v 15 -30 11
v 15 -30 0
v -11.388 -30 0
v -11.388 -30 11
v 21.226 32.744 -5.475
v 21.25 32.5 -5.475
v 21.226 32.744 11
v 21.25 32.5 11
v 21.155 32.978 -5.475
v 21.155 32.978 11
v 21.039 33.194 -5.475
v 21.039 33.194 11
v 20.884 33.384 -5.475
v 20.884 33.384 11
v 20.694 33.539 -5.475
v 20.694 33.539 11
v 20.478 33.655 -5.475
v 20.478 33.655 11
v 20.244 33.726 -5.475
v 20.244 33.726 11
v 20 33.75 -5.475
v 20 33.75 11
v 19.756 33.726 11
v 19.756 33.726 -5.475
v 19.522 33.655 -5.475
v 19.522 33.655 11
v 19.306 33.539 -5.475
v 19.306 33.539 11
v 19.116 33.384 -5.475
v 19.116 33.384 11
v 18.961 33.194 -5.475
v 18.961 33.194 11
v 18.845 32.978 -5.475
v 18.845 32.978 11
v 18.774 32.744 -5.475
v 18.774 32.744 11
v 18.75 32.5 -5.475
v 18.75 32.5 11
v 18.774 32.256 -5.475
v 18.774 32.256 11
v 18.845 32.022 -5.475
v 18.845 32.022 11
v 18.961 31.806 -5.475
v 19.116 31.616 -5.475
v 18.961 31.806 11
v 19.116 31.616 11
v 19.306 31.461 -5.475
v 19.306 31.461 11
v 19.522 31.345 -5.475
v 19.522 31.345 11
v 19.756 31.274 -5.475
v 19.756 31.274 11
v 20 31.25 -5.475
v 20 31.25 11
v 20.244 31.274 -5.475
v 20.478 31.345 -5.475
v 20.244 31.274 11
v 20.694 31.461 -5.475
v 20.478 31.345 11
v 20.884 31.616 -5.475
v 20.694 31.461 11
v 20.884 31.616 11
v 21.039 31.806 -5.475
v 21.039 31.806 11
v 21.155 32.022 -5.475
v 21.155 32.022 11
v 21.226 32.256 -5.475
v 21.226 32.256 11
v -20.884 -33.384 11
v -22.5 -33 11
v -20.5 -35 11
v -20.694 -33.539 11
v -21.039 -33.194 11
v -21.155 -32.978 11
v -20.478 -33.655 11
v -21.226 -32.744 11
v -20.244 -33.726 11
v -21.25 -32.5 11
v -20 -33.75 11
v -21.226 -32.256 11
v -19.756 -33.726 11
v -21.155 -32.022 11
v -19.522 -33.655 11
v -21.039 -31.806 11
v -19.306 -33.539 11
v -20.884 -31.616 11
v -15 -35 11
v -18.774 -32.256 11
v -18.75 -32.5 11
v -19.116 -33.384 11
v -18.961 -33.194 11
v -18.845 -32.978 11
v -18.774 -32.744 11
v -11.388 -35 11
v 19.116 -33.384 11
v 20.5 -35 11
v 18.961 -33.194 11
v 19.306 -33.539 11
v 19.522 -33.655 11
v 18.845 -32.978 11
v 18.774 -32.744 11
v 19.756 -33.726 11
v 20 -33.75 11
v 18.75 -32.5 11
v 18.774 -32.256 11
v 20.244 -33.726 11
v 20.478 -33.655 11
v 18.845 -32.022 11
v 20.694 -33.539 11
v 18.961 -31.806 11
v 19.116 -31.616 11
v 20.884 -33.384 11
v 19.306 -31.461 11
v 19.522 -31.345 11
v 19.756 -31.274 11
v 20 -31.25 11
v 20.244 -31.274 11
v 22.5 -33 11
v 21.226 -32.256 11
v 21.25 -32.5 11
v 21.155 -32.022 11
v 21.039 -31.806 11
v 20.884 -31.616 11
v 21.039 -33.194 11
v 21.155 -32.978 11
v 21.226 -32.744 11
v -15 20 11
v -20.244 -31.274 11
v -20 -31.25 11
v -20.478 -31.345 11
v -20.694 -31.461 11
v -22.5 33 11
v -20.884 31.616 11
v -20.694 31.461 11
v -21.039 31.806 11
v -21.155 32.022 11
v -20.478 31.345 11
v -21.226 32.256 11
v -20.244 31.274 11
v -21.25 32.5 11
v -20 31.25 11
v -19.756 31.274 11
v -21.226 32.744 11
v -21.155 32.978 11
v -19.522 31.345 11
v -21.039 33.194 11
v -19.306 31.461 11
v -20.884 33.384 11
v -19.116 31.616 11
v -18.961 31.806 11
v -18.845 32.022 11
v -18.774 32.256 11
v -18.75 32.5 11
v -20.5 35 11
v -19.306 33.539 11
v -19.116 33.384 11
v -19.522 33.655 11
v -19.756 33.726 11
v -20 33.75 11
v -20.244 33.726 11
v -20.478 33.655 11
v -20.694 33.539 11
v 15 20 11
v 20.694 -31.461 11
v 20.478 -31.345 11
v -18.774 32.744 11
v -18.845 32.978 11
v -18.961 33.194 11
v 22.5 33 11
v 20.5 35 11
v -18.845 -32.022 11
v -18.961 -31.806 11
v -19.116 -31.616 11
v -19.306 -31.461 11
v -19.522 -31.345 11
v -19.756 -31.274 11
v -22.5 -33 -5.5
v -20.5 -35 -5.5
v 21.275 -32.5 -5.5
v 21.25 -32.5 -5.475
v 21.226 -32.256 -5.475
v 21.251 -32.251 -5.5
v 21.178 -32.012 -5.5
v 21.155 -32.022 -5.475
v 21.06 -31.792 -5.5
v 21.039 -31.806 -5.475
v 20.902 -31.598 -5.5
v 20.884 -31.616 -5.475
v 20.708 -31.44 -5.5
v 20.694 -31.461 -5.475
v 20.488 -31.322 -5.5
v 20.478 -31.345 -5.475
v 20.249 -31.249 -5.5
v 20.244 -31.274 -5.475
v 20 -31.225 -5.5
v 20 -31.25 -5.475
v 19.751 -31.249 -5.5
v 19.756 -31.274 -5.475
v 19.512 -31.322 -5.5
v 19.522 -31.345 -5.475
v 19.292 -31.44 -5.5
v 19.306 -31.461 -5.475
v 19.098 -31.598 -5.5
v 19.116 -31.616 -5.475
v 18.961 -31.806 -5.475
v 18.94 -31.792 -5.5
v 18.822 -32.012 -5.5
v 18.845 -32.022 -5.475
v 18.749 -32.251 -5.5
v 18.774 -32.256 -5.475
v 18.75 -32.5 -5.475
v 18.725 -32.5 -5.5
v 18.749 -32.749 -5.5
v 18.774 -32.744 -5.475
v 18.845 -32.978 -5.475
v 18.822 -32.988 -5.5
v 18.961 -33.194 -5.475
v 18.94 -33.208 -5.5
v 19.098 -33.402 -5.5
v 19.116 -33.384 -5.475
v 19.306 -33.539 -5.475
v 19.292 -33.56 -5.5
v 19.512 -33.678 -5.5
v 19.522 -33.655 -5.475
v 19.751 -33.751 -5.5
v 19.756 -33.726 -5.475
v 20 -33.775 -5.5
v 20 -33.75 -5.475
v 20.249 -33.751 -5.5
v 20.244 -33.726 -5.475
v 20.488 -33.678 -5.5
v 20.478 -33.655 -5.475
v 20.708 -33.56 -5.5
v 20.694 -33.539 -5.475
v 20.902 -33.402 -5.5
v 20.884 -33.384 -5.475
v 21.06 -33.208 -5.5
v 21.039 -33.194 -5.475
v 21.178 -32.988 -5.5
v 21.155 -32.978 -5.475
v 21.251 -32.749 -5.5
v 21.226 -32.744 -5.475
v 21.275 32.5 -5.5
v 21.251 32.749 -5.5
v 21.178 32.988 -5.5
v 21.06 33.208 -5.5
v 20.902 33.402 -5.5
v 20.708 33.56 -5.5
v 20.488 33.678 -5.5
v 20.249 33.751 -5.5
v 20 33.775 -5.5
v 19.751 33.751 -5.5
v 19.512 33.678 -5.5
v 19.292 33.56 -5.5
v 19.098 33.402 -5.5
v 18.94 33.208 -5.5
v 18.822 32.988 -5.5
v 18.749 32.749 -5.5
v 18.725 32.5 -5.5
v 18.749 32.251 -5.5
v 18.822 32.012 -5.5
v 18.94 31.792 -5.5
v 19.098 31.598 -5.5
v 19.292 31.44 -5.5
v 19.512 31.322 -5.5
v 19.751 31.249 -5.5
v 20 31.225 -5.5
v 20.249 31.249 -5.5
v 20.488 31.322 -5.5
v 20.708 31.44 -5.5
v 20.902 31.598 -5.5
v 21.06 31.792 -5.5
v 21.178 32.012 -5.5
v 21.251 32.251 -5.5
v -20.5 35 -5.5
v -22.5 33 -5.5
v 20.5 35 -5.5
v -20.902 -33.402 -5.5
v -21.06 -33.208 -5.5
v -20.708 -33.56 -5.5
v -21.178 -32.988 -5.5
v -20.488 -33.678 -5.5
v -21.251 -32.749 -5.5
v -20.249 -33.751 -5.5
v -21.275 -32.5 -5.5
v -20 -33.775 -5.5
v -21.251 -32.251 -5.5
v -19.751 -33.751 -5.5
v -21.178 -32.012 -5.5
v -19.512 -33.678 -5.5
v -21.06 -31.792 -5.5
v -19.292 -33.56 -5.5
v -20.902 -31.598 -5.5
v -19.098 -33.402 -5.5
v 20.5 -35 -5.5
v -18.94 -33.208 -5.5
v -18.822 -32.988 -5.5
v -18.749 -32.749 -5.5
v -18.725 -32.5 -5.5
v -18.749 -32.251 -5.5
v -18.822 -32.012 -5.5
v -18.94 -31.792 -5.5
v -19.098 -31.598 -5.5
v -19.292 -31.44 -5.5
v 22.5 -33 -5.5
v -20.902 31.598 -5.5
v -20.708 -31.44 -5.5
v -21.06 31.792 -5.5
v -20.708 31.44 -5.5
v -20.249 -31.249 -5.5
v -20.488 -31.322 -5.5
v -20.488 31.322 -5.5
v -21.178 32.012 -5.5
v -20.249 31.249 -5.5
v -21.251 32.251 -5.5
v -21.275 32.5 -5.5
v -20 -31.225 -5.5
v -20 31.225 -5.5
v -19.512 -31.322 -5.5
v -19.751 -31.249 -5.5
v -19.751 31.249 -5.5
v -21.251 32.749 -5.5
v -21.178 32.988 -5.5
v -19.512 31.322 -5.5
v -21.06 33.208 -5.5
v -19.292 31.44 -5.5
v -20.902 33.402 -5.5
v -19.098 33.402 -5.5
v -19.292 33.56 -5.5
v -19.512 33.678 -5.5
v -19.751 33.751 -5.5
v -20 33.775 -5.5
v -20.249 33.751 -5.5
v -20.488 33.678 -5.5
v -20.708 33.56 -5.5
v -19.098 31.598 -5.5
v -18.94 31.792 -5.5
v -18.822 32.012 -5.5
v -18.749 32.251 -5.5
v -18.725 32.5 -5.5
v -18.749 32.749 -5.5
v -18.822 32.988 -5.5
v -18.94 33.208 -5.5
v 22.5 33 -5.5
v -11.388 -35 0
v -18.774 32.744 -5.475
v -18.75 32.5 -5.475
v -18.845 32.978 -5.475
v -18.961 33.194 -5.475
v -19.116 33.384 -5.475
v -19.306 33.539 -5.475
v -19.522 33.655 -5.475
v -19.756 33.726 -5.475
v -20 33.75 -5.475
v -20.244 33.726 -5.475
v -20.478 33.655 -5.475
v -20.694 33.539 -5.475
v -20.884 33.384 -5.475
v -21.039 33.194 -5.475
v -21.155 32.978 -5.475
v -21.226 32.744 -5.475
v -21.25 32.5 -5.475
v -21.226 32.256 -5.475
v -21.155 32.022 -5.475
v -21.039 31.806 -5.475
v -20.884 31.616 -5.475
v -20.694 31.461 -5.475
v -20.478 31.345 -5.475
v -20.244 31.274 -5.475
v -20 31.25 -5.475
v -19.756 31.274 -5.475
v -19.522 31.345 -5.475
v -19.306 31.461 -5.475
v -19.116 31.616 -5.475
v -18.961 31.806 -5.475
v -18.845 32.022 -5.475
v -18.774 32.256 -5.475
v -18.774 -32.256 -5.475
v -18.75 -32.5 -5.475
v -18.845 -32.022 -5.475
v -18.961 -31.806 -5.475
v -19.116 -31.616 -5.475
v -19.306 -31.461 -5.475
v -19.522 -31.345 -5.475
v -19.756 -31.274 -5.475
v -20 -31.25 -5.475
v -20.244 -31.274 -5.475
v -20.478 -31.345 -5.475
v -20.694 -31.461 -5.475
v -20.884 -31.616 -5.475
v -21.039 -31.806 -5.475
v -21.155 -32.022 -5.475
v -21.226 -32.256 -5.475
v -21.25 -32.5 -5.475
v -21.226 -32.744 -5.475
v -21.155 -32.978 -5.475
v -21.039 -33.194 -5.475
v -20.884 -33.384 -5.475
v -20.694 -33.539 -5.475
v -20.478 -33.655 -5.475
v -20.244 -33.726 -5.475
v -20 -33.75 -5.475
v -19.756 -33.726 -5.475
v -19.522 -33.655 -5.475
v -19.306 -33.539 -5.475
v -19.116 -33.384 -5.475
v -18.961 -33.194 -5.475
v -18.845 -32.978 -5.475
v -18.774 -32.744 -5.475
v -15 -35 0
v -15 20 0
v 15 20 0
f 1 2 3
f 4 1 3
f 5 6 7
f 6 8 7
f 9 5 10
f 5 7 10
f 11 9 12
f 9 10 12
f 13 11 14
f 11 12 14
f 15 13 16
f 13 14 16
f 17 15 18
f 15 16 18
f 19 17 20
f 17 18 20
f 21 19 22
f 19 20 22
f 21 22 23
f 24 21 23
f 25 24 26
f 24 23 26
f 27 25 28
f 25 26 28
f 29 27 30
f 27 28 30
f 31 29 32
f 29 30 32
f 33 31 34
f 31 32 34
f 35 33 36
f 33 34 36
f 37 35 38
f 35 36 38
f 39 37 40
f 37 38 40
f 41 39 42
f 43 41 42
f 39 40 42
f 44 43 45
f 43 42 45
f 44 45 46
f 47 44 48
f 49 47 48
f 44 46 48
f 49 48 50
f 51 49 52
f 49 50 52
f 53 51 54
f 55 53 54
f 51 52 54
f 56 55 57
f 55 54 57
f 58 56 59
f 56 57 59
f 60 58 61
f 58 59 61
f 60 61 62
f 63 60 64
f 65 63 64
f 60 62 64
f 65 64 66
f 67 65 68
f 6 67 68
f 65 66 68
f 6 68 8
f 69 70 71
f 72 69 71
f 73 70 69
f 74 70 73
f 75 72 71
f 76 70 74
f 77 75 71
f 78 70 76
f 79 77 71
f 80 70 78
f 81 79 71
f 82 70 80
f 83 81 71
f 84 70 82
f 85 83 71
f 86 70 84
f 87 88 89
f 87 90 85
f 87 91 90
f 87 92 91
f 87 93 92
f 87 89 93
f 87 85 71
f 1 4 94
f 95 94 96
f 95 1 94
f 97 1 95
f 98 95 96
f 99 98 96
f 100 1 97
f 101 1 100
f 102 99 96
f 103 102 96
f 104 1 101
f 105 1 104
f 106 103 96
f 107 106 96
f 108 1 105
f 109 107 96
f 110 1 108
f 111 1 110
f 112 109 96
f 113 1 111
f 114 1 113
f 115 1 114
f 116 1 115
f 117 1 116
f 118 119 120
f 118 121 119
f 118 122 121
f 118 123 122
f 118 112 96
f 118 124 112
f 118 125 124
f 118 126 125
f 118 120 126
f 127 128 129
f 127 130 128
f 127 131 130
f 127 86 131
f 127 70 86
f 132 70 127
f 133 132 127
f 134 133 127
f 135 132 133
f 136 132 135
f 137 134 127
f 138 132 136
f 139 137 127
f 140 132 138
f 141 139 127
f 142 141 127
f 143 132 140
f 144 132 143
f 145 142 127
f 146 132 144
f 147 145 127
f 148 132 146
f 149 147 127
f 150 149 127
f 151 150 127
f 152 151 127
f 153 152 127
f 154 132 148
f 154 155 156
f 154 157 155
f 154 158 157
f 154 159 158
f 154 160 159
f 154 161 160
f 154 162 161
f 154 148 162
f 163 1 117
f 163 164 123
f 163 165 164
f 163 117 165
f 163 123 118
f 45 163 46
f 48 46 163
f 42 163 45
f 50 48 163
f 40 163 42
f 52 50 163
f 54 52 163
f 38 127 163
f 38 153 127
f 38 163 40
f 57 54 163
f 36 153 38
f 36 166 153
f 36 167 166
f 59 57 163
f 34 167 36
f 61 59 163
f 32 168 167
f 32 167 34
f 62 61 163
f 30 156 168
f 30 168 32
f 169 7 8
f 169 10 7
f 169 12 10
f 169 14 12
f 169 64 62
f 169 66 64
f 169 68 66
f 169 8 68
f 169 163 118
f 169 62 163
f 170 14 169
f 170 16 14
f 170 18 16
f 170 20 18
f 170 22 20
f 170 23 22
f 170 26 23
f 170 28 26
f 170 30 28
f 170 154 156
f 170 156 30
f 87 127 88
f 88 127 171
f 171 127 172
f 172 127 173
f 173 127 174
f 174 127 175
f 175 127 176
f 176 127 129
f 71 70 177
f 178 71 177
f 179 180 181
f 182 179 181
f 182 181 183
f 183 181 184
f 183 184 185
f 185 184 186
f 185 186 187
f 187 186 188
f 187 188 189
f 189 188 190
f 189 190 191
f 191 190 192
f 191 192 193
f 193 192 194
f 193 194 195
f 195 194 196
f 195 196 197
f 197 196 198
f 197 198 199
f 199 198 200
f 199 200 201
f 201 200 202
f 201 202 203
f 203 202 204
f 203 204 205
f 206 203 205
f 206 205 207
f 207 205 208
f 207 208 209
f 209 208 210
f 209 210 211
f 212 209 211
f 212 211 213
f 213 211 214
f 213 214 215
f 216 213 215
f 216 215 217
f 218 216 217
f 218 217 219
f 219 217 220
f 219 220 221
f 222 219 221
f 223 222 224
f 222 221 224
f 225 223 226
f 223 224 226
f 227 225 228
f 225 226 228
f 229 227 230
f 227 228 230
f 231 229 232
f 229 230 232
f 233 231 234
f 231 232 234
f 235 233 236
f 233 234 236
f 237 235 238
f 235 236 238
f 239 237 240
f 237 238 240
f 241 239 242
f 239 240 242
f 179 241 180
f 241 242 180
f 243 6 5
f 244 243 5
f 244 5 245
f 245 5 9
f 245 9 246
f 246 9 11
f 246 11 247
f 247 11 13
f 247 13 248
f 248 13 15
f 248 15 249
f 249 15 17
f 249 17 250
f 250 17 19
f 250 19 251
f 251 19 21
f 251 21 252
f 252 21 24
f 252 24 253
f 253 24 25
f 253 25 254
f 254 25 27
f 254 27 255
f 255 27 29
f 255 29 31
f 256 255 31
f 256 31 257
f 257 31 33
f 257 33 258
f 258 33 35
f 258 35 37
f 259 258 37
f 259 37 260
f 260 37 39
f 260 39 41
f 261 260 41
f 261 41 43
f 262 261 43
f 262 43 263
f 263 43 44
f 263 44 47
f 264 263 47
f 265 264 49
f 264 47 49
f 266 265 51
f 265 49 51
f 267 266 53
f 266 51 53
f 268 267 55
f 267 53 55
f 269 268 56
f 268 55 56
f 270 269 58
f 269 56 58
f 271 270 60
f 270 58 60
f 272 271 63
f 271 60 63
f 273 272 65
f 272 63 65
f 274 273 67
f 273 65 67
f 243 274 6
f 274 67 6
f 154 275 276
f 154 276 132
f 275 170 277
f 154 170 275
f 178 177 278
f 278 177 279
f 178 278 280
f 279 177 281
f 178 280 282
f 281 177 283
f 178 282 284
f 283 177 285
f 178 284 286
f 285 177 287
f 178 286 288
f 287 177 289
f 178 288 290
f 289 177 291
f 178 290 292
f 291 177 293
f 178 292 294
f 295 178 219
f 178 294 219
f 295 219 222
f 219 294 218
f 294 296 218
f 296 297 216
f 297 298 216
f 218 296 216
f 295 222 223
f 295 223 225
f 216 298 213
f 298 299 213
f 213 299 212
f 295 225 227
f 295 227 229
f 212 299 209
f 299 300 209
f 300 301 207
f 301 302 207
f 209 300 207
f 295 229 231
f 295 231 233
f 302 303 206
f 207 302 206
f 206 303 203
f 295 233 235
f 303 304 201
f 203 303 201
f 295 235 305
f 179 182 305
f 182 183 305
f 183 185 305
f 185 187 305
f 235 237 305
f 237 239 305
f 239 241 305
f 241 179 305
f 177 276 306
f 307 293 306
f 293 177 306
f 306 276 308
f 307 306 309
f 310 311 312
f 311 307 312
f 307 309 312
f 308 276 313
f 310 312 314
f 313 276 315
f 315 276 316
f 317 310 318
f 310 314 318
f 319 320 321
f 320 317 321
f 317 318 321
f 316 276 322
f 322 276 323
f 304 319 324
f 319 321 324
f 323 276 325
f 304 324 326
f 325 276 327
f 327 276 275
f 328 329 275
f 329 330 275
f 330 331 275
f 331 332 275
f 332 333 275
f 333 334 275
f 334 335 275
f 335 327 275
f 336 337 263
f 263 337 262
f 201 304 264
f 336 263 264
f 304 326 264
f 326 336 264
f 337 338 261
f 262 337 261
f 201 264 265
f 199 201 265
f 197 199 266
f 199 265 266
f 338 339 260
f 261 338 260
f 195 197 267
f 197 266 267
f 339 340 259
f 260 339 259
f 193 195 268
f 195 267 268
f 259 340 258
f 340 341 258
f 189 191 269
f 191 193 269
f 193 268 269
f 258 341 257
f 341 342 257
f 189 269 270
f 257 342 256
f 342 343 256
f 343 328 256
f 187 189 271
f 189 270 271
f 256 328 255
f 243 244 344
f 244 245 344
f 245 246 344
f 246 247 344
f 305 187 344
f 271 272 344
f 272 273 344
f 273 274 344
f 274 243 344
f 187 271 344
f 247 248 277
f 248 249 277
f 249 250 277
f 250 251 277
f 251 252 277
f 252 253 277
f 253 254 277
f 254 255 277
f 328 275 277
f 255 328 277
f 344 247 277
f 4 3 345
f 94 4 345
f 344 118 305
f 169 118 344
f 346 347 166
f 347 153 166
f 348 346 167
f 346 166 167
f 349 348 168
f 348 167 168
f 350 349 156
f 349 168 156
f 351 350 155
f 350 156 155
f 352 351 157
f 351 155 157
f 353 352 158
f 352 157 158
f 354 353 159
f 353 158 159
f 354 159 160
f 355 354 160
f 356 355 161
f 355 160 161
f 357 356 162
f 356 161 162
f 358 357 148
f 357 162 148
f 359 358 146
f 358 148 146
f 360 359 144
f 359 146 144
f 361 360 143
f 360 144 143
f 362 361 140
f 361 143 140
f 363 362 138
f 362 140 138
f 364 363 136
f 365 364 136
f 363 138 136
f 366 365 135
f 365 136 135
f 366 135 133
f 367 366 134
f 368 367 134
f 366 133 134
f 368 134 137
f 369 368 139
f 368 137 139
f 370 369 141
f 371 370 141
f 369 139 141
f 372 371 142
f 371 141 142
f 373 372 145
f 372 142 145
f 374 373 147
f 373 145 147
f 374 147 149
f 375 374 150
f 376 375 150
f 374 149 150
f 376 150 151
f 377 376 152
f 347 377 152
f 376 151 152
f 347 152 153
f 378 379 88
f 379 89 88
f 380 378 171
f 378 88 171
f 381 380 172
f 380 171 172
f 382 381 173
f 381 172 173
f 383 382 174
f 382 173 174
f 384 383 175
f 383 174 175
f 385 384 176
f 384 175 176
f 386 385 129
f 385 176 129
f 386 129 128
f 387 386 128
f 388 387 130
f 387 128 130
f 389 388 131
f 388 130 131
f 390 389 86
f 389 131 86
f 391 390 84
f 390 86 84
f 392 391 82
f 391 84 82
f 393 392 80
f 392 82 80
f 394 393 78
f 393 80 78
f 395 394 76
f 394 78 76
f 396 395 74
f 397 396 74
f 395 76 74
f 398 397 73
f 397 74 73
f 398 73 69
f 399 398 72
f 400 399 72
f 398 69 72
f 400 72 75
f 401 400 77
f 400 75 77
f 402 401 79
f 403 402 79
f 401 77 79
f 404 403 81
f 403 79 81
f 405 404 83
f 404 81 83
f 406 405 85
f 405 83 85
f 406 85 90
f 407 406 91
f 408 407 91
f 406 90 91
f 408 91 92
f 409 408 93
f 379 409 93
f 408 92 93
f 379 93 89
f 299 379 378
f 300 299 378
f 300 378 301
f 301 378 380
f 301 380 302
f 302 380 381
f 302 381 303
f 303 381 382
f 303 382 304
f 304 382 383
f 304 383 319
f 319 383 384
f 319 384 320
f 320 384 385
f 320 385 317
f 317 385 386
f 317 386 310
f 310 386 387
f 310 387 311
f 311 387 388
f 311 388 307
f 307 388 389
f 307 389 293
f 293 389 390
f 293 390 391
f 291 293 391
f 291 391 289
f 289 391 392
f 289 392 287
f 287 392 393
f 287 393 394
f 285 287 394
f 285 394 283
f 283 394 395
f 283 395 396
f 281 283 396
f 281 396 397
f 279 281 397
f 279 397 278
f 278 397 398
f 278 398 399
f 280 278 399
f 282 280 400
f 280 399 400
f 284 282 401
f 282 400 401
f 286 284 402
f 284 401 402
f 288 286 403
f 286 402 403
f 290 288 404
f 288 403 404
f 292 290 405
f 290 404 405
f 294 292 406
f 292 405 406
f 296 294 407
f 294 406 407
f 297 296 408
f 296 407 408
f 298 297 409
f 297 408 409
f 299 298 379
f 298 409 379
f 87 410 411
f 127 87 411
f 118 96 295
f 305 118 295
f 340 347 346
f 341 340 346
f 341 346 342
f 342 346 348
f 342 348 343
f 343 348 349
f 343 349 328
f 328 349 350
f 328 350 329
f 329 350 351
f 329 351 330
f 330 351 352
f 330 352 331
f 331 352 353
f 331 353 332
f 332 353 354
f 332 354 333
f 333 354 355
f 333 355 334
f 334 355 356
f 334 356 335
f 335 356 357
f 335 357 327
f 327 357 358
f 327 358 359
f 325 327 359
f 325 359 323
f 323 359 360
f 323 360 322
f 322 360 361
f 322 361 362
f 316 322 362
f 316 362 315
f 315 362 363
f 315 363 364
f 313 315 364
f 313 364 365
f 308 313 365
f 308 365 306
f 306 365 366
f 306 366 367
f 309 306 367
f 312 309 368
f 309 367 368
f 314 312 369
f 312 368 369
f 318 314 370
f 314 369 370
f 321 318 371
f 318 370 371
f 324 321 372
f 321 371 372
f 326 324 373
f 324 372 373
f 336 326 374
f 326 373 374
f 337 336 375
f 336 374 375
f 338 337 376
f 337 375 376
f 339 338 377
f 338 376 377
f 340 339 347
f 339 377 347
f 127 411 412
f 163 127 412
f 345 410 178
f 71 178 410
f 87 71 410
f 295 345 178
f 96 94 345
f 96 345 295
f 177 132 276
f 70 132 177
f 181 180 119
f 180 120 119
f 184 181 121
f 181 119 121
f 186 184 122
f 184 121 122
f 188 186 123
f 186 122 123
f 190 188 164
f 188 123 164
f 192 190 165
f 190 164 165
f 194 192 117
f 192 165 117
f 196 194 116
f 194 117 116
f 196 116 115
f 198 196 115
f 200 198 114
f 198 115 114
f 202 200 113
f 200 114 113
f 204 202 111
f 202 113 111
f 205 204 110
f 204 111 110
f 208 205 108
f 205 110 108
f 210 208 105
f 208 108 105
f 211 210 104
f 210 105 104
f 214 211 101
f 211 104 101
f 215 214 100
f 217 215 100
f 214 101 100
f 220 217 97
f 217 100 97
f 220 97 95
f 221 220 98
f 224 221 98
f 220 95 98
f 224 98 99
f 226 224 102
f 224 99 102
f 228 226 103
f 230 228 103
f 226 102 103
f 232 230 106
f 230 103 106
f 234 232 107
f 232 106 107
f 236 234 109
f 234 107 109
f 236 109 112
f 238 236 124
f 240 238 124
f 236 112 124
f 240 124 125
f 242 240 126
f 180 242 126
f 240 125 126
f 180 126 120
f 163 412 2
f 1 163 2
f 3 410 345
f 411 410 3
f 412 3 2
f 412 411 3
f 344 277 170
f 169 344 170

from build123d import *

# Parameters (mm, degrees)
BOSS_EXTRUDE1_DEPTH               = 11
SKETCH1_3_W                       = 45
SKETCH1_3_H                       = 70
BOSS_EXTRUDE2_DEPTH               = 5.5
TAP_DRILL_FOR_M3_TAP1_D           = 2.5
TAP_DRILL_FOR_M3_TAP1_CSINK_D     = 2.55
TAP_DRILL_FOR_M3_TAP1_CSINK_ANGLE = 90
CHAMFER1_SIZE                     = 2


with BuildPart() as part:
    # Sketch1 → Boss-Extrude1 (new body)
    with BuildSketch(Plane.XY):
        Polygon((-11.388490073, -35), (22.5, -35), (22.5, 35), (-22.5, 35), (-22.5, -35), (-15, -35), (-15, -30), (-15, 20), (15, 20), (15, -30), (-11.388490073, -30), align=None)
    extrude(amount=BOSS_EXTRUDE1_DEPTH)

    # Sketch1<3> → Boss-Extrude2 (add)
    with BuildSketch(Plane.XY):
        Rectangle(SKETCH1_3_W, SKETCH1_3_H)
    extrude(amount=-BOSS_EXTRUDE2_DEPTH)

    # Tap Drill for M3 Tap1 (through all)
    with Locations(Plane(origin=(0, 0, -5.5), x_dir=(-1, 0, 0), z_dir=(0, 0, -1))):
        with Locations((20, 32.5), (-20, 32.5), (-20, -32.5), (20, -32.5)):
            CounterSinkHole(TAP_DRILL_FOR_M3_TAP1_D / 2, TAP_DRILL_FOR_M3_TAP1_CSINK_D / 2, counter_sink_angle=TAP_DRILL_FOR_M3_TAP1_CSINK_ANGLE)

    # Chamfer1
    chamfer1_edges = [part.edges().sort_by_distance(p)[0] for p in [
        (22.5, -35, 2.75),
        (22.5, 35, 2.75),
        (-22.5, 35, 2.75),
        (-22.5, -35, 2.75),
    ]]
    chamfer(chamfer1_edges, length=CHAMFER1_SIZE)


solid = part.part
